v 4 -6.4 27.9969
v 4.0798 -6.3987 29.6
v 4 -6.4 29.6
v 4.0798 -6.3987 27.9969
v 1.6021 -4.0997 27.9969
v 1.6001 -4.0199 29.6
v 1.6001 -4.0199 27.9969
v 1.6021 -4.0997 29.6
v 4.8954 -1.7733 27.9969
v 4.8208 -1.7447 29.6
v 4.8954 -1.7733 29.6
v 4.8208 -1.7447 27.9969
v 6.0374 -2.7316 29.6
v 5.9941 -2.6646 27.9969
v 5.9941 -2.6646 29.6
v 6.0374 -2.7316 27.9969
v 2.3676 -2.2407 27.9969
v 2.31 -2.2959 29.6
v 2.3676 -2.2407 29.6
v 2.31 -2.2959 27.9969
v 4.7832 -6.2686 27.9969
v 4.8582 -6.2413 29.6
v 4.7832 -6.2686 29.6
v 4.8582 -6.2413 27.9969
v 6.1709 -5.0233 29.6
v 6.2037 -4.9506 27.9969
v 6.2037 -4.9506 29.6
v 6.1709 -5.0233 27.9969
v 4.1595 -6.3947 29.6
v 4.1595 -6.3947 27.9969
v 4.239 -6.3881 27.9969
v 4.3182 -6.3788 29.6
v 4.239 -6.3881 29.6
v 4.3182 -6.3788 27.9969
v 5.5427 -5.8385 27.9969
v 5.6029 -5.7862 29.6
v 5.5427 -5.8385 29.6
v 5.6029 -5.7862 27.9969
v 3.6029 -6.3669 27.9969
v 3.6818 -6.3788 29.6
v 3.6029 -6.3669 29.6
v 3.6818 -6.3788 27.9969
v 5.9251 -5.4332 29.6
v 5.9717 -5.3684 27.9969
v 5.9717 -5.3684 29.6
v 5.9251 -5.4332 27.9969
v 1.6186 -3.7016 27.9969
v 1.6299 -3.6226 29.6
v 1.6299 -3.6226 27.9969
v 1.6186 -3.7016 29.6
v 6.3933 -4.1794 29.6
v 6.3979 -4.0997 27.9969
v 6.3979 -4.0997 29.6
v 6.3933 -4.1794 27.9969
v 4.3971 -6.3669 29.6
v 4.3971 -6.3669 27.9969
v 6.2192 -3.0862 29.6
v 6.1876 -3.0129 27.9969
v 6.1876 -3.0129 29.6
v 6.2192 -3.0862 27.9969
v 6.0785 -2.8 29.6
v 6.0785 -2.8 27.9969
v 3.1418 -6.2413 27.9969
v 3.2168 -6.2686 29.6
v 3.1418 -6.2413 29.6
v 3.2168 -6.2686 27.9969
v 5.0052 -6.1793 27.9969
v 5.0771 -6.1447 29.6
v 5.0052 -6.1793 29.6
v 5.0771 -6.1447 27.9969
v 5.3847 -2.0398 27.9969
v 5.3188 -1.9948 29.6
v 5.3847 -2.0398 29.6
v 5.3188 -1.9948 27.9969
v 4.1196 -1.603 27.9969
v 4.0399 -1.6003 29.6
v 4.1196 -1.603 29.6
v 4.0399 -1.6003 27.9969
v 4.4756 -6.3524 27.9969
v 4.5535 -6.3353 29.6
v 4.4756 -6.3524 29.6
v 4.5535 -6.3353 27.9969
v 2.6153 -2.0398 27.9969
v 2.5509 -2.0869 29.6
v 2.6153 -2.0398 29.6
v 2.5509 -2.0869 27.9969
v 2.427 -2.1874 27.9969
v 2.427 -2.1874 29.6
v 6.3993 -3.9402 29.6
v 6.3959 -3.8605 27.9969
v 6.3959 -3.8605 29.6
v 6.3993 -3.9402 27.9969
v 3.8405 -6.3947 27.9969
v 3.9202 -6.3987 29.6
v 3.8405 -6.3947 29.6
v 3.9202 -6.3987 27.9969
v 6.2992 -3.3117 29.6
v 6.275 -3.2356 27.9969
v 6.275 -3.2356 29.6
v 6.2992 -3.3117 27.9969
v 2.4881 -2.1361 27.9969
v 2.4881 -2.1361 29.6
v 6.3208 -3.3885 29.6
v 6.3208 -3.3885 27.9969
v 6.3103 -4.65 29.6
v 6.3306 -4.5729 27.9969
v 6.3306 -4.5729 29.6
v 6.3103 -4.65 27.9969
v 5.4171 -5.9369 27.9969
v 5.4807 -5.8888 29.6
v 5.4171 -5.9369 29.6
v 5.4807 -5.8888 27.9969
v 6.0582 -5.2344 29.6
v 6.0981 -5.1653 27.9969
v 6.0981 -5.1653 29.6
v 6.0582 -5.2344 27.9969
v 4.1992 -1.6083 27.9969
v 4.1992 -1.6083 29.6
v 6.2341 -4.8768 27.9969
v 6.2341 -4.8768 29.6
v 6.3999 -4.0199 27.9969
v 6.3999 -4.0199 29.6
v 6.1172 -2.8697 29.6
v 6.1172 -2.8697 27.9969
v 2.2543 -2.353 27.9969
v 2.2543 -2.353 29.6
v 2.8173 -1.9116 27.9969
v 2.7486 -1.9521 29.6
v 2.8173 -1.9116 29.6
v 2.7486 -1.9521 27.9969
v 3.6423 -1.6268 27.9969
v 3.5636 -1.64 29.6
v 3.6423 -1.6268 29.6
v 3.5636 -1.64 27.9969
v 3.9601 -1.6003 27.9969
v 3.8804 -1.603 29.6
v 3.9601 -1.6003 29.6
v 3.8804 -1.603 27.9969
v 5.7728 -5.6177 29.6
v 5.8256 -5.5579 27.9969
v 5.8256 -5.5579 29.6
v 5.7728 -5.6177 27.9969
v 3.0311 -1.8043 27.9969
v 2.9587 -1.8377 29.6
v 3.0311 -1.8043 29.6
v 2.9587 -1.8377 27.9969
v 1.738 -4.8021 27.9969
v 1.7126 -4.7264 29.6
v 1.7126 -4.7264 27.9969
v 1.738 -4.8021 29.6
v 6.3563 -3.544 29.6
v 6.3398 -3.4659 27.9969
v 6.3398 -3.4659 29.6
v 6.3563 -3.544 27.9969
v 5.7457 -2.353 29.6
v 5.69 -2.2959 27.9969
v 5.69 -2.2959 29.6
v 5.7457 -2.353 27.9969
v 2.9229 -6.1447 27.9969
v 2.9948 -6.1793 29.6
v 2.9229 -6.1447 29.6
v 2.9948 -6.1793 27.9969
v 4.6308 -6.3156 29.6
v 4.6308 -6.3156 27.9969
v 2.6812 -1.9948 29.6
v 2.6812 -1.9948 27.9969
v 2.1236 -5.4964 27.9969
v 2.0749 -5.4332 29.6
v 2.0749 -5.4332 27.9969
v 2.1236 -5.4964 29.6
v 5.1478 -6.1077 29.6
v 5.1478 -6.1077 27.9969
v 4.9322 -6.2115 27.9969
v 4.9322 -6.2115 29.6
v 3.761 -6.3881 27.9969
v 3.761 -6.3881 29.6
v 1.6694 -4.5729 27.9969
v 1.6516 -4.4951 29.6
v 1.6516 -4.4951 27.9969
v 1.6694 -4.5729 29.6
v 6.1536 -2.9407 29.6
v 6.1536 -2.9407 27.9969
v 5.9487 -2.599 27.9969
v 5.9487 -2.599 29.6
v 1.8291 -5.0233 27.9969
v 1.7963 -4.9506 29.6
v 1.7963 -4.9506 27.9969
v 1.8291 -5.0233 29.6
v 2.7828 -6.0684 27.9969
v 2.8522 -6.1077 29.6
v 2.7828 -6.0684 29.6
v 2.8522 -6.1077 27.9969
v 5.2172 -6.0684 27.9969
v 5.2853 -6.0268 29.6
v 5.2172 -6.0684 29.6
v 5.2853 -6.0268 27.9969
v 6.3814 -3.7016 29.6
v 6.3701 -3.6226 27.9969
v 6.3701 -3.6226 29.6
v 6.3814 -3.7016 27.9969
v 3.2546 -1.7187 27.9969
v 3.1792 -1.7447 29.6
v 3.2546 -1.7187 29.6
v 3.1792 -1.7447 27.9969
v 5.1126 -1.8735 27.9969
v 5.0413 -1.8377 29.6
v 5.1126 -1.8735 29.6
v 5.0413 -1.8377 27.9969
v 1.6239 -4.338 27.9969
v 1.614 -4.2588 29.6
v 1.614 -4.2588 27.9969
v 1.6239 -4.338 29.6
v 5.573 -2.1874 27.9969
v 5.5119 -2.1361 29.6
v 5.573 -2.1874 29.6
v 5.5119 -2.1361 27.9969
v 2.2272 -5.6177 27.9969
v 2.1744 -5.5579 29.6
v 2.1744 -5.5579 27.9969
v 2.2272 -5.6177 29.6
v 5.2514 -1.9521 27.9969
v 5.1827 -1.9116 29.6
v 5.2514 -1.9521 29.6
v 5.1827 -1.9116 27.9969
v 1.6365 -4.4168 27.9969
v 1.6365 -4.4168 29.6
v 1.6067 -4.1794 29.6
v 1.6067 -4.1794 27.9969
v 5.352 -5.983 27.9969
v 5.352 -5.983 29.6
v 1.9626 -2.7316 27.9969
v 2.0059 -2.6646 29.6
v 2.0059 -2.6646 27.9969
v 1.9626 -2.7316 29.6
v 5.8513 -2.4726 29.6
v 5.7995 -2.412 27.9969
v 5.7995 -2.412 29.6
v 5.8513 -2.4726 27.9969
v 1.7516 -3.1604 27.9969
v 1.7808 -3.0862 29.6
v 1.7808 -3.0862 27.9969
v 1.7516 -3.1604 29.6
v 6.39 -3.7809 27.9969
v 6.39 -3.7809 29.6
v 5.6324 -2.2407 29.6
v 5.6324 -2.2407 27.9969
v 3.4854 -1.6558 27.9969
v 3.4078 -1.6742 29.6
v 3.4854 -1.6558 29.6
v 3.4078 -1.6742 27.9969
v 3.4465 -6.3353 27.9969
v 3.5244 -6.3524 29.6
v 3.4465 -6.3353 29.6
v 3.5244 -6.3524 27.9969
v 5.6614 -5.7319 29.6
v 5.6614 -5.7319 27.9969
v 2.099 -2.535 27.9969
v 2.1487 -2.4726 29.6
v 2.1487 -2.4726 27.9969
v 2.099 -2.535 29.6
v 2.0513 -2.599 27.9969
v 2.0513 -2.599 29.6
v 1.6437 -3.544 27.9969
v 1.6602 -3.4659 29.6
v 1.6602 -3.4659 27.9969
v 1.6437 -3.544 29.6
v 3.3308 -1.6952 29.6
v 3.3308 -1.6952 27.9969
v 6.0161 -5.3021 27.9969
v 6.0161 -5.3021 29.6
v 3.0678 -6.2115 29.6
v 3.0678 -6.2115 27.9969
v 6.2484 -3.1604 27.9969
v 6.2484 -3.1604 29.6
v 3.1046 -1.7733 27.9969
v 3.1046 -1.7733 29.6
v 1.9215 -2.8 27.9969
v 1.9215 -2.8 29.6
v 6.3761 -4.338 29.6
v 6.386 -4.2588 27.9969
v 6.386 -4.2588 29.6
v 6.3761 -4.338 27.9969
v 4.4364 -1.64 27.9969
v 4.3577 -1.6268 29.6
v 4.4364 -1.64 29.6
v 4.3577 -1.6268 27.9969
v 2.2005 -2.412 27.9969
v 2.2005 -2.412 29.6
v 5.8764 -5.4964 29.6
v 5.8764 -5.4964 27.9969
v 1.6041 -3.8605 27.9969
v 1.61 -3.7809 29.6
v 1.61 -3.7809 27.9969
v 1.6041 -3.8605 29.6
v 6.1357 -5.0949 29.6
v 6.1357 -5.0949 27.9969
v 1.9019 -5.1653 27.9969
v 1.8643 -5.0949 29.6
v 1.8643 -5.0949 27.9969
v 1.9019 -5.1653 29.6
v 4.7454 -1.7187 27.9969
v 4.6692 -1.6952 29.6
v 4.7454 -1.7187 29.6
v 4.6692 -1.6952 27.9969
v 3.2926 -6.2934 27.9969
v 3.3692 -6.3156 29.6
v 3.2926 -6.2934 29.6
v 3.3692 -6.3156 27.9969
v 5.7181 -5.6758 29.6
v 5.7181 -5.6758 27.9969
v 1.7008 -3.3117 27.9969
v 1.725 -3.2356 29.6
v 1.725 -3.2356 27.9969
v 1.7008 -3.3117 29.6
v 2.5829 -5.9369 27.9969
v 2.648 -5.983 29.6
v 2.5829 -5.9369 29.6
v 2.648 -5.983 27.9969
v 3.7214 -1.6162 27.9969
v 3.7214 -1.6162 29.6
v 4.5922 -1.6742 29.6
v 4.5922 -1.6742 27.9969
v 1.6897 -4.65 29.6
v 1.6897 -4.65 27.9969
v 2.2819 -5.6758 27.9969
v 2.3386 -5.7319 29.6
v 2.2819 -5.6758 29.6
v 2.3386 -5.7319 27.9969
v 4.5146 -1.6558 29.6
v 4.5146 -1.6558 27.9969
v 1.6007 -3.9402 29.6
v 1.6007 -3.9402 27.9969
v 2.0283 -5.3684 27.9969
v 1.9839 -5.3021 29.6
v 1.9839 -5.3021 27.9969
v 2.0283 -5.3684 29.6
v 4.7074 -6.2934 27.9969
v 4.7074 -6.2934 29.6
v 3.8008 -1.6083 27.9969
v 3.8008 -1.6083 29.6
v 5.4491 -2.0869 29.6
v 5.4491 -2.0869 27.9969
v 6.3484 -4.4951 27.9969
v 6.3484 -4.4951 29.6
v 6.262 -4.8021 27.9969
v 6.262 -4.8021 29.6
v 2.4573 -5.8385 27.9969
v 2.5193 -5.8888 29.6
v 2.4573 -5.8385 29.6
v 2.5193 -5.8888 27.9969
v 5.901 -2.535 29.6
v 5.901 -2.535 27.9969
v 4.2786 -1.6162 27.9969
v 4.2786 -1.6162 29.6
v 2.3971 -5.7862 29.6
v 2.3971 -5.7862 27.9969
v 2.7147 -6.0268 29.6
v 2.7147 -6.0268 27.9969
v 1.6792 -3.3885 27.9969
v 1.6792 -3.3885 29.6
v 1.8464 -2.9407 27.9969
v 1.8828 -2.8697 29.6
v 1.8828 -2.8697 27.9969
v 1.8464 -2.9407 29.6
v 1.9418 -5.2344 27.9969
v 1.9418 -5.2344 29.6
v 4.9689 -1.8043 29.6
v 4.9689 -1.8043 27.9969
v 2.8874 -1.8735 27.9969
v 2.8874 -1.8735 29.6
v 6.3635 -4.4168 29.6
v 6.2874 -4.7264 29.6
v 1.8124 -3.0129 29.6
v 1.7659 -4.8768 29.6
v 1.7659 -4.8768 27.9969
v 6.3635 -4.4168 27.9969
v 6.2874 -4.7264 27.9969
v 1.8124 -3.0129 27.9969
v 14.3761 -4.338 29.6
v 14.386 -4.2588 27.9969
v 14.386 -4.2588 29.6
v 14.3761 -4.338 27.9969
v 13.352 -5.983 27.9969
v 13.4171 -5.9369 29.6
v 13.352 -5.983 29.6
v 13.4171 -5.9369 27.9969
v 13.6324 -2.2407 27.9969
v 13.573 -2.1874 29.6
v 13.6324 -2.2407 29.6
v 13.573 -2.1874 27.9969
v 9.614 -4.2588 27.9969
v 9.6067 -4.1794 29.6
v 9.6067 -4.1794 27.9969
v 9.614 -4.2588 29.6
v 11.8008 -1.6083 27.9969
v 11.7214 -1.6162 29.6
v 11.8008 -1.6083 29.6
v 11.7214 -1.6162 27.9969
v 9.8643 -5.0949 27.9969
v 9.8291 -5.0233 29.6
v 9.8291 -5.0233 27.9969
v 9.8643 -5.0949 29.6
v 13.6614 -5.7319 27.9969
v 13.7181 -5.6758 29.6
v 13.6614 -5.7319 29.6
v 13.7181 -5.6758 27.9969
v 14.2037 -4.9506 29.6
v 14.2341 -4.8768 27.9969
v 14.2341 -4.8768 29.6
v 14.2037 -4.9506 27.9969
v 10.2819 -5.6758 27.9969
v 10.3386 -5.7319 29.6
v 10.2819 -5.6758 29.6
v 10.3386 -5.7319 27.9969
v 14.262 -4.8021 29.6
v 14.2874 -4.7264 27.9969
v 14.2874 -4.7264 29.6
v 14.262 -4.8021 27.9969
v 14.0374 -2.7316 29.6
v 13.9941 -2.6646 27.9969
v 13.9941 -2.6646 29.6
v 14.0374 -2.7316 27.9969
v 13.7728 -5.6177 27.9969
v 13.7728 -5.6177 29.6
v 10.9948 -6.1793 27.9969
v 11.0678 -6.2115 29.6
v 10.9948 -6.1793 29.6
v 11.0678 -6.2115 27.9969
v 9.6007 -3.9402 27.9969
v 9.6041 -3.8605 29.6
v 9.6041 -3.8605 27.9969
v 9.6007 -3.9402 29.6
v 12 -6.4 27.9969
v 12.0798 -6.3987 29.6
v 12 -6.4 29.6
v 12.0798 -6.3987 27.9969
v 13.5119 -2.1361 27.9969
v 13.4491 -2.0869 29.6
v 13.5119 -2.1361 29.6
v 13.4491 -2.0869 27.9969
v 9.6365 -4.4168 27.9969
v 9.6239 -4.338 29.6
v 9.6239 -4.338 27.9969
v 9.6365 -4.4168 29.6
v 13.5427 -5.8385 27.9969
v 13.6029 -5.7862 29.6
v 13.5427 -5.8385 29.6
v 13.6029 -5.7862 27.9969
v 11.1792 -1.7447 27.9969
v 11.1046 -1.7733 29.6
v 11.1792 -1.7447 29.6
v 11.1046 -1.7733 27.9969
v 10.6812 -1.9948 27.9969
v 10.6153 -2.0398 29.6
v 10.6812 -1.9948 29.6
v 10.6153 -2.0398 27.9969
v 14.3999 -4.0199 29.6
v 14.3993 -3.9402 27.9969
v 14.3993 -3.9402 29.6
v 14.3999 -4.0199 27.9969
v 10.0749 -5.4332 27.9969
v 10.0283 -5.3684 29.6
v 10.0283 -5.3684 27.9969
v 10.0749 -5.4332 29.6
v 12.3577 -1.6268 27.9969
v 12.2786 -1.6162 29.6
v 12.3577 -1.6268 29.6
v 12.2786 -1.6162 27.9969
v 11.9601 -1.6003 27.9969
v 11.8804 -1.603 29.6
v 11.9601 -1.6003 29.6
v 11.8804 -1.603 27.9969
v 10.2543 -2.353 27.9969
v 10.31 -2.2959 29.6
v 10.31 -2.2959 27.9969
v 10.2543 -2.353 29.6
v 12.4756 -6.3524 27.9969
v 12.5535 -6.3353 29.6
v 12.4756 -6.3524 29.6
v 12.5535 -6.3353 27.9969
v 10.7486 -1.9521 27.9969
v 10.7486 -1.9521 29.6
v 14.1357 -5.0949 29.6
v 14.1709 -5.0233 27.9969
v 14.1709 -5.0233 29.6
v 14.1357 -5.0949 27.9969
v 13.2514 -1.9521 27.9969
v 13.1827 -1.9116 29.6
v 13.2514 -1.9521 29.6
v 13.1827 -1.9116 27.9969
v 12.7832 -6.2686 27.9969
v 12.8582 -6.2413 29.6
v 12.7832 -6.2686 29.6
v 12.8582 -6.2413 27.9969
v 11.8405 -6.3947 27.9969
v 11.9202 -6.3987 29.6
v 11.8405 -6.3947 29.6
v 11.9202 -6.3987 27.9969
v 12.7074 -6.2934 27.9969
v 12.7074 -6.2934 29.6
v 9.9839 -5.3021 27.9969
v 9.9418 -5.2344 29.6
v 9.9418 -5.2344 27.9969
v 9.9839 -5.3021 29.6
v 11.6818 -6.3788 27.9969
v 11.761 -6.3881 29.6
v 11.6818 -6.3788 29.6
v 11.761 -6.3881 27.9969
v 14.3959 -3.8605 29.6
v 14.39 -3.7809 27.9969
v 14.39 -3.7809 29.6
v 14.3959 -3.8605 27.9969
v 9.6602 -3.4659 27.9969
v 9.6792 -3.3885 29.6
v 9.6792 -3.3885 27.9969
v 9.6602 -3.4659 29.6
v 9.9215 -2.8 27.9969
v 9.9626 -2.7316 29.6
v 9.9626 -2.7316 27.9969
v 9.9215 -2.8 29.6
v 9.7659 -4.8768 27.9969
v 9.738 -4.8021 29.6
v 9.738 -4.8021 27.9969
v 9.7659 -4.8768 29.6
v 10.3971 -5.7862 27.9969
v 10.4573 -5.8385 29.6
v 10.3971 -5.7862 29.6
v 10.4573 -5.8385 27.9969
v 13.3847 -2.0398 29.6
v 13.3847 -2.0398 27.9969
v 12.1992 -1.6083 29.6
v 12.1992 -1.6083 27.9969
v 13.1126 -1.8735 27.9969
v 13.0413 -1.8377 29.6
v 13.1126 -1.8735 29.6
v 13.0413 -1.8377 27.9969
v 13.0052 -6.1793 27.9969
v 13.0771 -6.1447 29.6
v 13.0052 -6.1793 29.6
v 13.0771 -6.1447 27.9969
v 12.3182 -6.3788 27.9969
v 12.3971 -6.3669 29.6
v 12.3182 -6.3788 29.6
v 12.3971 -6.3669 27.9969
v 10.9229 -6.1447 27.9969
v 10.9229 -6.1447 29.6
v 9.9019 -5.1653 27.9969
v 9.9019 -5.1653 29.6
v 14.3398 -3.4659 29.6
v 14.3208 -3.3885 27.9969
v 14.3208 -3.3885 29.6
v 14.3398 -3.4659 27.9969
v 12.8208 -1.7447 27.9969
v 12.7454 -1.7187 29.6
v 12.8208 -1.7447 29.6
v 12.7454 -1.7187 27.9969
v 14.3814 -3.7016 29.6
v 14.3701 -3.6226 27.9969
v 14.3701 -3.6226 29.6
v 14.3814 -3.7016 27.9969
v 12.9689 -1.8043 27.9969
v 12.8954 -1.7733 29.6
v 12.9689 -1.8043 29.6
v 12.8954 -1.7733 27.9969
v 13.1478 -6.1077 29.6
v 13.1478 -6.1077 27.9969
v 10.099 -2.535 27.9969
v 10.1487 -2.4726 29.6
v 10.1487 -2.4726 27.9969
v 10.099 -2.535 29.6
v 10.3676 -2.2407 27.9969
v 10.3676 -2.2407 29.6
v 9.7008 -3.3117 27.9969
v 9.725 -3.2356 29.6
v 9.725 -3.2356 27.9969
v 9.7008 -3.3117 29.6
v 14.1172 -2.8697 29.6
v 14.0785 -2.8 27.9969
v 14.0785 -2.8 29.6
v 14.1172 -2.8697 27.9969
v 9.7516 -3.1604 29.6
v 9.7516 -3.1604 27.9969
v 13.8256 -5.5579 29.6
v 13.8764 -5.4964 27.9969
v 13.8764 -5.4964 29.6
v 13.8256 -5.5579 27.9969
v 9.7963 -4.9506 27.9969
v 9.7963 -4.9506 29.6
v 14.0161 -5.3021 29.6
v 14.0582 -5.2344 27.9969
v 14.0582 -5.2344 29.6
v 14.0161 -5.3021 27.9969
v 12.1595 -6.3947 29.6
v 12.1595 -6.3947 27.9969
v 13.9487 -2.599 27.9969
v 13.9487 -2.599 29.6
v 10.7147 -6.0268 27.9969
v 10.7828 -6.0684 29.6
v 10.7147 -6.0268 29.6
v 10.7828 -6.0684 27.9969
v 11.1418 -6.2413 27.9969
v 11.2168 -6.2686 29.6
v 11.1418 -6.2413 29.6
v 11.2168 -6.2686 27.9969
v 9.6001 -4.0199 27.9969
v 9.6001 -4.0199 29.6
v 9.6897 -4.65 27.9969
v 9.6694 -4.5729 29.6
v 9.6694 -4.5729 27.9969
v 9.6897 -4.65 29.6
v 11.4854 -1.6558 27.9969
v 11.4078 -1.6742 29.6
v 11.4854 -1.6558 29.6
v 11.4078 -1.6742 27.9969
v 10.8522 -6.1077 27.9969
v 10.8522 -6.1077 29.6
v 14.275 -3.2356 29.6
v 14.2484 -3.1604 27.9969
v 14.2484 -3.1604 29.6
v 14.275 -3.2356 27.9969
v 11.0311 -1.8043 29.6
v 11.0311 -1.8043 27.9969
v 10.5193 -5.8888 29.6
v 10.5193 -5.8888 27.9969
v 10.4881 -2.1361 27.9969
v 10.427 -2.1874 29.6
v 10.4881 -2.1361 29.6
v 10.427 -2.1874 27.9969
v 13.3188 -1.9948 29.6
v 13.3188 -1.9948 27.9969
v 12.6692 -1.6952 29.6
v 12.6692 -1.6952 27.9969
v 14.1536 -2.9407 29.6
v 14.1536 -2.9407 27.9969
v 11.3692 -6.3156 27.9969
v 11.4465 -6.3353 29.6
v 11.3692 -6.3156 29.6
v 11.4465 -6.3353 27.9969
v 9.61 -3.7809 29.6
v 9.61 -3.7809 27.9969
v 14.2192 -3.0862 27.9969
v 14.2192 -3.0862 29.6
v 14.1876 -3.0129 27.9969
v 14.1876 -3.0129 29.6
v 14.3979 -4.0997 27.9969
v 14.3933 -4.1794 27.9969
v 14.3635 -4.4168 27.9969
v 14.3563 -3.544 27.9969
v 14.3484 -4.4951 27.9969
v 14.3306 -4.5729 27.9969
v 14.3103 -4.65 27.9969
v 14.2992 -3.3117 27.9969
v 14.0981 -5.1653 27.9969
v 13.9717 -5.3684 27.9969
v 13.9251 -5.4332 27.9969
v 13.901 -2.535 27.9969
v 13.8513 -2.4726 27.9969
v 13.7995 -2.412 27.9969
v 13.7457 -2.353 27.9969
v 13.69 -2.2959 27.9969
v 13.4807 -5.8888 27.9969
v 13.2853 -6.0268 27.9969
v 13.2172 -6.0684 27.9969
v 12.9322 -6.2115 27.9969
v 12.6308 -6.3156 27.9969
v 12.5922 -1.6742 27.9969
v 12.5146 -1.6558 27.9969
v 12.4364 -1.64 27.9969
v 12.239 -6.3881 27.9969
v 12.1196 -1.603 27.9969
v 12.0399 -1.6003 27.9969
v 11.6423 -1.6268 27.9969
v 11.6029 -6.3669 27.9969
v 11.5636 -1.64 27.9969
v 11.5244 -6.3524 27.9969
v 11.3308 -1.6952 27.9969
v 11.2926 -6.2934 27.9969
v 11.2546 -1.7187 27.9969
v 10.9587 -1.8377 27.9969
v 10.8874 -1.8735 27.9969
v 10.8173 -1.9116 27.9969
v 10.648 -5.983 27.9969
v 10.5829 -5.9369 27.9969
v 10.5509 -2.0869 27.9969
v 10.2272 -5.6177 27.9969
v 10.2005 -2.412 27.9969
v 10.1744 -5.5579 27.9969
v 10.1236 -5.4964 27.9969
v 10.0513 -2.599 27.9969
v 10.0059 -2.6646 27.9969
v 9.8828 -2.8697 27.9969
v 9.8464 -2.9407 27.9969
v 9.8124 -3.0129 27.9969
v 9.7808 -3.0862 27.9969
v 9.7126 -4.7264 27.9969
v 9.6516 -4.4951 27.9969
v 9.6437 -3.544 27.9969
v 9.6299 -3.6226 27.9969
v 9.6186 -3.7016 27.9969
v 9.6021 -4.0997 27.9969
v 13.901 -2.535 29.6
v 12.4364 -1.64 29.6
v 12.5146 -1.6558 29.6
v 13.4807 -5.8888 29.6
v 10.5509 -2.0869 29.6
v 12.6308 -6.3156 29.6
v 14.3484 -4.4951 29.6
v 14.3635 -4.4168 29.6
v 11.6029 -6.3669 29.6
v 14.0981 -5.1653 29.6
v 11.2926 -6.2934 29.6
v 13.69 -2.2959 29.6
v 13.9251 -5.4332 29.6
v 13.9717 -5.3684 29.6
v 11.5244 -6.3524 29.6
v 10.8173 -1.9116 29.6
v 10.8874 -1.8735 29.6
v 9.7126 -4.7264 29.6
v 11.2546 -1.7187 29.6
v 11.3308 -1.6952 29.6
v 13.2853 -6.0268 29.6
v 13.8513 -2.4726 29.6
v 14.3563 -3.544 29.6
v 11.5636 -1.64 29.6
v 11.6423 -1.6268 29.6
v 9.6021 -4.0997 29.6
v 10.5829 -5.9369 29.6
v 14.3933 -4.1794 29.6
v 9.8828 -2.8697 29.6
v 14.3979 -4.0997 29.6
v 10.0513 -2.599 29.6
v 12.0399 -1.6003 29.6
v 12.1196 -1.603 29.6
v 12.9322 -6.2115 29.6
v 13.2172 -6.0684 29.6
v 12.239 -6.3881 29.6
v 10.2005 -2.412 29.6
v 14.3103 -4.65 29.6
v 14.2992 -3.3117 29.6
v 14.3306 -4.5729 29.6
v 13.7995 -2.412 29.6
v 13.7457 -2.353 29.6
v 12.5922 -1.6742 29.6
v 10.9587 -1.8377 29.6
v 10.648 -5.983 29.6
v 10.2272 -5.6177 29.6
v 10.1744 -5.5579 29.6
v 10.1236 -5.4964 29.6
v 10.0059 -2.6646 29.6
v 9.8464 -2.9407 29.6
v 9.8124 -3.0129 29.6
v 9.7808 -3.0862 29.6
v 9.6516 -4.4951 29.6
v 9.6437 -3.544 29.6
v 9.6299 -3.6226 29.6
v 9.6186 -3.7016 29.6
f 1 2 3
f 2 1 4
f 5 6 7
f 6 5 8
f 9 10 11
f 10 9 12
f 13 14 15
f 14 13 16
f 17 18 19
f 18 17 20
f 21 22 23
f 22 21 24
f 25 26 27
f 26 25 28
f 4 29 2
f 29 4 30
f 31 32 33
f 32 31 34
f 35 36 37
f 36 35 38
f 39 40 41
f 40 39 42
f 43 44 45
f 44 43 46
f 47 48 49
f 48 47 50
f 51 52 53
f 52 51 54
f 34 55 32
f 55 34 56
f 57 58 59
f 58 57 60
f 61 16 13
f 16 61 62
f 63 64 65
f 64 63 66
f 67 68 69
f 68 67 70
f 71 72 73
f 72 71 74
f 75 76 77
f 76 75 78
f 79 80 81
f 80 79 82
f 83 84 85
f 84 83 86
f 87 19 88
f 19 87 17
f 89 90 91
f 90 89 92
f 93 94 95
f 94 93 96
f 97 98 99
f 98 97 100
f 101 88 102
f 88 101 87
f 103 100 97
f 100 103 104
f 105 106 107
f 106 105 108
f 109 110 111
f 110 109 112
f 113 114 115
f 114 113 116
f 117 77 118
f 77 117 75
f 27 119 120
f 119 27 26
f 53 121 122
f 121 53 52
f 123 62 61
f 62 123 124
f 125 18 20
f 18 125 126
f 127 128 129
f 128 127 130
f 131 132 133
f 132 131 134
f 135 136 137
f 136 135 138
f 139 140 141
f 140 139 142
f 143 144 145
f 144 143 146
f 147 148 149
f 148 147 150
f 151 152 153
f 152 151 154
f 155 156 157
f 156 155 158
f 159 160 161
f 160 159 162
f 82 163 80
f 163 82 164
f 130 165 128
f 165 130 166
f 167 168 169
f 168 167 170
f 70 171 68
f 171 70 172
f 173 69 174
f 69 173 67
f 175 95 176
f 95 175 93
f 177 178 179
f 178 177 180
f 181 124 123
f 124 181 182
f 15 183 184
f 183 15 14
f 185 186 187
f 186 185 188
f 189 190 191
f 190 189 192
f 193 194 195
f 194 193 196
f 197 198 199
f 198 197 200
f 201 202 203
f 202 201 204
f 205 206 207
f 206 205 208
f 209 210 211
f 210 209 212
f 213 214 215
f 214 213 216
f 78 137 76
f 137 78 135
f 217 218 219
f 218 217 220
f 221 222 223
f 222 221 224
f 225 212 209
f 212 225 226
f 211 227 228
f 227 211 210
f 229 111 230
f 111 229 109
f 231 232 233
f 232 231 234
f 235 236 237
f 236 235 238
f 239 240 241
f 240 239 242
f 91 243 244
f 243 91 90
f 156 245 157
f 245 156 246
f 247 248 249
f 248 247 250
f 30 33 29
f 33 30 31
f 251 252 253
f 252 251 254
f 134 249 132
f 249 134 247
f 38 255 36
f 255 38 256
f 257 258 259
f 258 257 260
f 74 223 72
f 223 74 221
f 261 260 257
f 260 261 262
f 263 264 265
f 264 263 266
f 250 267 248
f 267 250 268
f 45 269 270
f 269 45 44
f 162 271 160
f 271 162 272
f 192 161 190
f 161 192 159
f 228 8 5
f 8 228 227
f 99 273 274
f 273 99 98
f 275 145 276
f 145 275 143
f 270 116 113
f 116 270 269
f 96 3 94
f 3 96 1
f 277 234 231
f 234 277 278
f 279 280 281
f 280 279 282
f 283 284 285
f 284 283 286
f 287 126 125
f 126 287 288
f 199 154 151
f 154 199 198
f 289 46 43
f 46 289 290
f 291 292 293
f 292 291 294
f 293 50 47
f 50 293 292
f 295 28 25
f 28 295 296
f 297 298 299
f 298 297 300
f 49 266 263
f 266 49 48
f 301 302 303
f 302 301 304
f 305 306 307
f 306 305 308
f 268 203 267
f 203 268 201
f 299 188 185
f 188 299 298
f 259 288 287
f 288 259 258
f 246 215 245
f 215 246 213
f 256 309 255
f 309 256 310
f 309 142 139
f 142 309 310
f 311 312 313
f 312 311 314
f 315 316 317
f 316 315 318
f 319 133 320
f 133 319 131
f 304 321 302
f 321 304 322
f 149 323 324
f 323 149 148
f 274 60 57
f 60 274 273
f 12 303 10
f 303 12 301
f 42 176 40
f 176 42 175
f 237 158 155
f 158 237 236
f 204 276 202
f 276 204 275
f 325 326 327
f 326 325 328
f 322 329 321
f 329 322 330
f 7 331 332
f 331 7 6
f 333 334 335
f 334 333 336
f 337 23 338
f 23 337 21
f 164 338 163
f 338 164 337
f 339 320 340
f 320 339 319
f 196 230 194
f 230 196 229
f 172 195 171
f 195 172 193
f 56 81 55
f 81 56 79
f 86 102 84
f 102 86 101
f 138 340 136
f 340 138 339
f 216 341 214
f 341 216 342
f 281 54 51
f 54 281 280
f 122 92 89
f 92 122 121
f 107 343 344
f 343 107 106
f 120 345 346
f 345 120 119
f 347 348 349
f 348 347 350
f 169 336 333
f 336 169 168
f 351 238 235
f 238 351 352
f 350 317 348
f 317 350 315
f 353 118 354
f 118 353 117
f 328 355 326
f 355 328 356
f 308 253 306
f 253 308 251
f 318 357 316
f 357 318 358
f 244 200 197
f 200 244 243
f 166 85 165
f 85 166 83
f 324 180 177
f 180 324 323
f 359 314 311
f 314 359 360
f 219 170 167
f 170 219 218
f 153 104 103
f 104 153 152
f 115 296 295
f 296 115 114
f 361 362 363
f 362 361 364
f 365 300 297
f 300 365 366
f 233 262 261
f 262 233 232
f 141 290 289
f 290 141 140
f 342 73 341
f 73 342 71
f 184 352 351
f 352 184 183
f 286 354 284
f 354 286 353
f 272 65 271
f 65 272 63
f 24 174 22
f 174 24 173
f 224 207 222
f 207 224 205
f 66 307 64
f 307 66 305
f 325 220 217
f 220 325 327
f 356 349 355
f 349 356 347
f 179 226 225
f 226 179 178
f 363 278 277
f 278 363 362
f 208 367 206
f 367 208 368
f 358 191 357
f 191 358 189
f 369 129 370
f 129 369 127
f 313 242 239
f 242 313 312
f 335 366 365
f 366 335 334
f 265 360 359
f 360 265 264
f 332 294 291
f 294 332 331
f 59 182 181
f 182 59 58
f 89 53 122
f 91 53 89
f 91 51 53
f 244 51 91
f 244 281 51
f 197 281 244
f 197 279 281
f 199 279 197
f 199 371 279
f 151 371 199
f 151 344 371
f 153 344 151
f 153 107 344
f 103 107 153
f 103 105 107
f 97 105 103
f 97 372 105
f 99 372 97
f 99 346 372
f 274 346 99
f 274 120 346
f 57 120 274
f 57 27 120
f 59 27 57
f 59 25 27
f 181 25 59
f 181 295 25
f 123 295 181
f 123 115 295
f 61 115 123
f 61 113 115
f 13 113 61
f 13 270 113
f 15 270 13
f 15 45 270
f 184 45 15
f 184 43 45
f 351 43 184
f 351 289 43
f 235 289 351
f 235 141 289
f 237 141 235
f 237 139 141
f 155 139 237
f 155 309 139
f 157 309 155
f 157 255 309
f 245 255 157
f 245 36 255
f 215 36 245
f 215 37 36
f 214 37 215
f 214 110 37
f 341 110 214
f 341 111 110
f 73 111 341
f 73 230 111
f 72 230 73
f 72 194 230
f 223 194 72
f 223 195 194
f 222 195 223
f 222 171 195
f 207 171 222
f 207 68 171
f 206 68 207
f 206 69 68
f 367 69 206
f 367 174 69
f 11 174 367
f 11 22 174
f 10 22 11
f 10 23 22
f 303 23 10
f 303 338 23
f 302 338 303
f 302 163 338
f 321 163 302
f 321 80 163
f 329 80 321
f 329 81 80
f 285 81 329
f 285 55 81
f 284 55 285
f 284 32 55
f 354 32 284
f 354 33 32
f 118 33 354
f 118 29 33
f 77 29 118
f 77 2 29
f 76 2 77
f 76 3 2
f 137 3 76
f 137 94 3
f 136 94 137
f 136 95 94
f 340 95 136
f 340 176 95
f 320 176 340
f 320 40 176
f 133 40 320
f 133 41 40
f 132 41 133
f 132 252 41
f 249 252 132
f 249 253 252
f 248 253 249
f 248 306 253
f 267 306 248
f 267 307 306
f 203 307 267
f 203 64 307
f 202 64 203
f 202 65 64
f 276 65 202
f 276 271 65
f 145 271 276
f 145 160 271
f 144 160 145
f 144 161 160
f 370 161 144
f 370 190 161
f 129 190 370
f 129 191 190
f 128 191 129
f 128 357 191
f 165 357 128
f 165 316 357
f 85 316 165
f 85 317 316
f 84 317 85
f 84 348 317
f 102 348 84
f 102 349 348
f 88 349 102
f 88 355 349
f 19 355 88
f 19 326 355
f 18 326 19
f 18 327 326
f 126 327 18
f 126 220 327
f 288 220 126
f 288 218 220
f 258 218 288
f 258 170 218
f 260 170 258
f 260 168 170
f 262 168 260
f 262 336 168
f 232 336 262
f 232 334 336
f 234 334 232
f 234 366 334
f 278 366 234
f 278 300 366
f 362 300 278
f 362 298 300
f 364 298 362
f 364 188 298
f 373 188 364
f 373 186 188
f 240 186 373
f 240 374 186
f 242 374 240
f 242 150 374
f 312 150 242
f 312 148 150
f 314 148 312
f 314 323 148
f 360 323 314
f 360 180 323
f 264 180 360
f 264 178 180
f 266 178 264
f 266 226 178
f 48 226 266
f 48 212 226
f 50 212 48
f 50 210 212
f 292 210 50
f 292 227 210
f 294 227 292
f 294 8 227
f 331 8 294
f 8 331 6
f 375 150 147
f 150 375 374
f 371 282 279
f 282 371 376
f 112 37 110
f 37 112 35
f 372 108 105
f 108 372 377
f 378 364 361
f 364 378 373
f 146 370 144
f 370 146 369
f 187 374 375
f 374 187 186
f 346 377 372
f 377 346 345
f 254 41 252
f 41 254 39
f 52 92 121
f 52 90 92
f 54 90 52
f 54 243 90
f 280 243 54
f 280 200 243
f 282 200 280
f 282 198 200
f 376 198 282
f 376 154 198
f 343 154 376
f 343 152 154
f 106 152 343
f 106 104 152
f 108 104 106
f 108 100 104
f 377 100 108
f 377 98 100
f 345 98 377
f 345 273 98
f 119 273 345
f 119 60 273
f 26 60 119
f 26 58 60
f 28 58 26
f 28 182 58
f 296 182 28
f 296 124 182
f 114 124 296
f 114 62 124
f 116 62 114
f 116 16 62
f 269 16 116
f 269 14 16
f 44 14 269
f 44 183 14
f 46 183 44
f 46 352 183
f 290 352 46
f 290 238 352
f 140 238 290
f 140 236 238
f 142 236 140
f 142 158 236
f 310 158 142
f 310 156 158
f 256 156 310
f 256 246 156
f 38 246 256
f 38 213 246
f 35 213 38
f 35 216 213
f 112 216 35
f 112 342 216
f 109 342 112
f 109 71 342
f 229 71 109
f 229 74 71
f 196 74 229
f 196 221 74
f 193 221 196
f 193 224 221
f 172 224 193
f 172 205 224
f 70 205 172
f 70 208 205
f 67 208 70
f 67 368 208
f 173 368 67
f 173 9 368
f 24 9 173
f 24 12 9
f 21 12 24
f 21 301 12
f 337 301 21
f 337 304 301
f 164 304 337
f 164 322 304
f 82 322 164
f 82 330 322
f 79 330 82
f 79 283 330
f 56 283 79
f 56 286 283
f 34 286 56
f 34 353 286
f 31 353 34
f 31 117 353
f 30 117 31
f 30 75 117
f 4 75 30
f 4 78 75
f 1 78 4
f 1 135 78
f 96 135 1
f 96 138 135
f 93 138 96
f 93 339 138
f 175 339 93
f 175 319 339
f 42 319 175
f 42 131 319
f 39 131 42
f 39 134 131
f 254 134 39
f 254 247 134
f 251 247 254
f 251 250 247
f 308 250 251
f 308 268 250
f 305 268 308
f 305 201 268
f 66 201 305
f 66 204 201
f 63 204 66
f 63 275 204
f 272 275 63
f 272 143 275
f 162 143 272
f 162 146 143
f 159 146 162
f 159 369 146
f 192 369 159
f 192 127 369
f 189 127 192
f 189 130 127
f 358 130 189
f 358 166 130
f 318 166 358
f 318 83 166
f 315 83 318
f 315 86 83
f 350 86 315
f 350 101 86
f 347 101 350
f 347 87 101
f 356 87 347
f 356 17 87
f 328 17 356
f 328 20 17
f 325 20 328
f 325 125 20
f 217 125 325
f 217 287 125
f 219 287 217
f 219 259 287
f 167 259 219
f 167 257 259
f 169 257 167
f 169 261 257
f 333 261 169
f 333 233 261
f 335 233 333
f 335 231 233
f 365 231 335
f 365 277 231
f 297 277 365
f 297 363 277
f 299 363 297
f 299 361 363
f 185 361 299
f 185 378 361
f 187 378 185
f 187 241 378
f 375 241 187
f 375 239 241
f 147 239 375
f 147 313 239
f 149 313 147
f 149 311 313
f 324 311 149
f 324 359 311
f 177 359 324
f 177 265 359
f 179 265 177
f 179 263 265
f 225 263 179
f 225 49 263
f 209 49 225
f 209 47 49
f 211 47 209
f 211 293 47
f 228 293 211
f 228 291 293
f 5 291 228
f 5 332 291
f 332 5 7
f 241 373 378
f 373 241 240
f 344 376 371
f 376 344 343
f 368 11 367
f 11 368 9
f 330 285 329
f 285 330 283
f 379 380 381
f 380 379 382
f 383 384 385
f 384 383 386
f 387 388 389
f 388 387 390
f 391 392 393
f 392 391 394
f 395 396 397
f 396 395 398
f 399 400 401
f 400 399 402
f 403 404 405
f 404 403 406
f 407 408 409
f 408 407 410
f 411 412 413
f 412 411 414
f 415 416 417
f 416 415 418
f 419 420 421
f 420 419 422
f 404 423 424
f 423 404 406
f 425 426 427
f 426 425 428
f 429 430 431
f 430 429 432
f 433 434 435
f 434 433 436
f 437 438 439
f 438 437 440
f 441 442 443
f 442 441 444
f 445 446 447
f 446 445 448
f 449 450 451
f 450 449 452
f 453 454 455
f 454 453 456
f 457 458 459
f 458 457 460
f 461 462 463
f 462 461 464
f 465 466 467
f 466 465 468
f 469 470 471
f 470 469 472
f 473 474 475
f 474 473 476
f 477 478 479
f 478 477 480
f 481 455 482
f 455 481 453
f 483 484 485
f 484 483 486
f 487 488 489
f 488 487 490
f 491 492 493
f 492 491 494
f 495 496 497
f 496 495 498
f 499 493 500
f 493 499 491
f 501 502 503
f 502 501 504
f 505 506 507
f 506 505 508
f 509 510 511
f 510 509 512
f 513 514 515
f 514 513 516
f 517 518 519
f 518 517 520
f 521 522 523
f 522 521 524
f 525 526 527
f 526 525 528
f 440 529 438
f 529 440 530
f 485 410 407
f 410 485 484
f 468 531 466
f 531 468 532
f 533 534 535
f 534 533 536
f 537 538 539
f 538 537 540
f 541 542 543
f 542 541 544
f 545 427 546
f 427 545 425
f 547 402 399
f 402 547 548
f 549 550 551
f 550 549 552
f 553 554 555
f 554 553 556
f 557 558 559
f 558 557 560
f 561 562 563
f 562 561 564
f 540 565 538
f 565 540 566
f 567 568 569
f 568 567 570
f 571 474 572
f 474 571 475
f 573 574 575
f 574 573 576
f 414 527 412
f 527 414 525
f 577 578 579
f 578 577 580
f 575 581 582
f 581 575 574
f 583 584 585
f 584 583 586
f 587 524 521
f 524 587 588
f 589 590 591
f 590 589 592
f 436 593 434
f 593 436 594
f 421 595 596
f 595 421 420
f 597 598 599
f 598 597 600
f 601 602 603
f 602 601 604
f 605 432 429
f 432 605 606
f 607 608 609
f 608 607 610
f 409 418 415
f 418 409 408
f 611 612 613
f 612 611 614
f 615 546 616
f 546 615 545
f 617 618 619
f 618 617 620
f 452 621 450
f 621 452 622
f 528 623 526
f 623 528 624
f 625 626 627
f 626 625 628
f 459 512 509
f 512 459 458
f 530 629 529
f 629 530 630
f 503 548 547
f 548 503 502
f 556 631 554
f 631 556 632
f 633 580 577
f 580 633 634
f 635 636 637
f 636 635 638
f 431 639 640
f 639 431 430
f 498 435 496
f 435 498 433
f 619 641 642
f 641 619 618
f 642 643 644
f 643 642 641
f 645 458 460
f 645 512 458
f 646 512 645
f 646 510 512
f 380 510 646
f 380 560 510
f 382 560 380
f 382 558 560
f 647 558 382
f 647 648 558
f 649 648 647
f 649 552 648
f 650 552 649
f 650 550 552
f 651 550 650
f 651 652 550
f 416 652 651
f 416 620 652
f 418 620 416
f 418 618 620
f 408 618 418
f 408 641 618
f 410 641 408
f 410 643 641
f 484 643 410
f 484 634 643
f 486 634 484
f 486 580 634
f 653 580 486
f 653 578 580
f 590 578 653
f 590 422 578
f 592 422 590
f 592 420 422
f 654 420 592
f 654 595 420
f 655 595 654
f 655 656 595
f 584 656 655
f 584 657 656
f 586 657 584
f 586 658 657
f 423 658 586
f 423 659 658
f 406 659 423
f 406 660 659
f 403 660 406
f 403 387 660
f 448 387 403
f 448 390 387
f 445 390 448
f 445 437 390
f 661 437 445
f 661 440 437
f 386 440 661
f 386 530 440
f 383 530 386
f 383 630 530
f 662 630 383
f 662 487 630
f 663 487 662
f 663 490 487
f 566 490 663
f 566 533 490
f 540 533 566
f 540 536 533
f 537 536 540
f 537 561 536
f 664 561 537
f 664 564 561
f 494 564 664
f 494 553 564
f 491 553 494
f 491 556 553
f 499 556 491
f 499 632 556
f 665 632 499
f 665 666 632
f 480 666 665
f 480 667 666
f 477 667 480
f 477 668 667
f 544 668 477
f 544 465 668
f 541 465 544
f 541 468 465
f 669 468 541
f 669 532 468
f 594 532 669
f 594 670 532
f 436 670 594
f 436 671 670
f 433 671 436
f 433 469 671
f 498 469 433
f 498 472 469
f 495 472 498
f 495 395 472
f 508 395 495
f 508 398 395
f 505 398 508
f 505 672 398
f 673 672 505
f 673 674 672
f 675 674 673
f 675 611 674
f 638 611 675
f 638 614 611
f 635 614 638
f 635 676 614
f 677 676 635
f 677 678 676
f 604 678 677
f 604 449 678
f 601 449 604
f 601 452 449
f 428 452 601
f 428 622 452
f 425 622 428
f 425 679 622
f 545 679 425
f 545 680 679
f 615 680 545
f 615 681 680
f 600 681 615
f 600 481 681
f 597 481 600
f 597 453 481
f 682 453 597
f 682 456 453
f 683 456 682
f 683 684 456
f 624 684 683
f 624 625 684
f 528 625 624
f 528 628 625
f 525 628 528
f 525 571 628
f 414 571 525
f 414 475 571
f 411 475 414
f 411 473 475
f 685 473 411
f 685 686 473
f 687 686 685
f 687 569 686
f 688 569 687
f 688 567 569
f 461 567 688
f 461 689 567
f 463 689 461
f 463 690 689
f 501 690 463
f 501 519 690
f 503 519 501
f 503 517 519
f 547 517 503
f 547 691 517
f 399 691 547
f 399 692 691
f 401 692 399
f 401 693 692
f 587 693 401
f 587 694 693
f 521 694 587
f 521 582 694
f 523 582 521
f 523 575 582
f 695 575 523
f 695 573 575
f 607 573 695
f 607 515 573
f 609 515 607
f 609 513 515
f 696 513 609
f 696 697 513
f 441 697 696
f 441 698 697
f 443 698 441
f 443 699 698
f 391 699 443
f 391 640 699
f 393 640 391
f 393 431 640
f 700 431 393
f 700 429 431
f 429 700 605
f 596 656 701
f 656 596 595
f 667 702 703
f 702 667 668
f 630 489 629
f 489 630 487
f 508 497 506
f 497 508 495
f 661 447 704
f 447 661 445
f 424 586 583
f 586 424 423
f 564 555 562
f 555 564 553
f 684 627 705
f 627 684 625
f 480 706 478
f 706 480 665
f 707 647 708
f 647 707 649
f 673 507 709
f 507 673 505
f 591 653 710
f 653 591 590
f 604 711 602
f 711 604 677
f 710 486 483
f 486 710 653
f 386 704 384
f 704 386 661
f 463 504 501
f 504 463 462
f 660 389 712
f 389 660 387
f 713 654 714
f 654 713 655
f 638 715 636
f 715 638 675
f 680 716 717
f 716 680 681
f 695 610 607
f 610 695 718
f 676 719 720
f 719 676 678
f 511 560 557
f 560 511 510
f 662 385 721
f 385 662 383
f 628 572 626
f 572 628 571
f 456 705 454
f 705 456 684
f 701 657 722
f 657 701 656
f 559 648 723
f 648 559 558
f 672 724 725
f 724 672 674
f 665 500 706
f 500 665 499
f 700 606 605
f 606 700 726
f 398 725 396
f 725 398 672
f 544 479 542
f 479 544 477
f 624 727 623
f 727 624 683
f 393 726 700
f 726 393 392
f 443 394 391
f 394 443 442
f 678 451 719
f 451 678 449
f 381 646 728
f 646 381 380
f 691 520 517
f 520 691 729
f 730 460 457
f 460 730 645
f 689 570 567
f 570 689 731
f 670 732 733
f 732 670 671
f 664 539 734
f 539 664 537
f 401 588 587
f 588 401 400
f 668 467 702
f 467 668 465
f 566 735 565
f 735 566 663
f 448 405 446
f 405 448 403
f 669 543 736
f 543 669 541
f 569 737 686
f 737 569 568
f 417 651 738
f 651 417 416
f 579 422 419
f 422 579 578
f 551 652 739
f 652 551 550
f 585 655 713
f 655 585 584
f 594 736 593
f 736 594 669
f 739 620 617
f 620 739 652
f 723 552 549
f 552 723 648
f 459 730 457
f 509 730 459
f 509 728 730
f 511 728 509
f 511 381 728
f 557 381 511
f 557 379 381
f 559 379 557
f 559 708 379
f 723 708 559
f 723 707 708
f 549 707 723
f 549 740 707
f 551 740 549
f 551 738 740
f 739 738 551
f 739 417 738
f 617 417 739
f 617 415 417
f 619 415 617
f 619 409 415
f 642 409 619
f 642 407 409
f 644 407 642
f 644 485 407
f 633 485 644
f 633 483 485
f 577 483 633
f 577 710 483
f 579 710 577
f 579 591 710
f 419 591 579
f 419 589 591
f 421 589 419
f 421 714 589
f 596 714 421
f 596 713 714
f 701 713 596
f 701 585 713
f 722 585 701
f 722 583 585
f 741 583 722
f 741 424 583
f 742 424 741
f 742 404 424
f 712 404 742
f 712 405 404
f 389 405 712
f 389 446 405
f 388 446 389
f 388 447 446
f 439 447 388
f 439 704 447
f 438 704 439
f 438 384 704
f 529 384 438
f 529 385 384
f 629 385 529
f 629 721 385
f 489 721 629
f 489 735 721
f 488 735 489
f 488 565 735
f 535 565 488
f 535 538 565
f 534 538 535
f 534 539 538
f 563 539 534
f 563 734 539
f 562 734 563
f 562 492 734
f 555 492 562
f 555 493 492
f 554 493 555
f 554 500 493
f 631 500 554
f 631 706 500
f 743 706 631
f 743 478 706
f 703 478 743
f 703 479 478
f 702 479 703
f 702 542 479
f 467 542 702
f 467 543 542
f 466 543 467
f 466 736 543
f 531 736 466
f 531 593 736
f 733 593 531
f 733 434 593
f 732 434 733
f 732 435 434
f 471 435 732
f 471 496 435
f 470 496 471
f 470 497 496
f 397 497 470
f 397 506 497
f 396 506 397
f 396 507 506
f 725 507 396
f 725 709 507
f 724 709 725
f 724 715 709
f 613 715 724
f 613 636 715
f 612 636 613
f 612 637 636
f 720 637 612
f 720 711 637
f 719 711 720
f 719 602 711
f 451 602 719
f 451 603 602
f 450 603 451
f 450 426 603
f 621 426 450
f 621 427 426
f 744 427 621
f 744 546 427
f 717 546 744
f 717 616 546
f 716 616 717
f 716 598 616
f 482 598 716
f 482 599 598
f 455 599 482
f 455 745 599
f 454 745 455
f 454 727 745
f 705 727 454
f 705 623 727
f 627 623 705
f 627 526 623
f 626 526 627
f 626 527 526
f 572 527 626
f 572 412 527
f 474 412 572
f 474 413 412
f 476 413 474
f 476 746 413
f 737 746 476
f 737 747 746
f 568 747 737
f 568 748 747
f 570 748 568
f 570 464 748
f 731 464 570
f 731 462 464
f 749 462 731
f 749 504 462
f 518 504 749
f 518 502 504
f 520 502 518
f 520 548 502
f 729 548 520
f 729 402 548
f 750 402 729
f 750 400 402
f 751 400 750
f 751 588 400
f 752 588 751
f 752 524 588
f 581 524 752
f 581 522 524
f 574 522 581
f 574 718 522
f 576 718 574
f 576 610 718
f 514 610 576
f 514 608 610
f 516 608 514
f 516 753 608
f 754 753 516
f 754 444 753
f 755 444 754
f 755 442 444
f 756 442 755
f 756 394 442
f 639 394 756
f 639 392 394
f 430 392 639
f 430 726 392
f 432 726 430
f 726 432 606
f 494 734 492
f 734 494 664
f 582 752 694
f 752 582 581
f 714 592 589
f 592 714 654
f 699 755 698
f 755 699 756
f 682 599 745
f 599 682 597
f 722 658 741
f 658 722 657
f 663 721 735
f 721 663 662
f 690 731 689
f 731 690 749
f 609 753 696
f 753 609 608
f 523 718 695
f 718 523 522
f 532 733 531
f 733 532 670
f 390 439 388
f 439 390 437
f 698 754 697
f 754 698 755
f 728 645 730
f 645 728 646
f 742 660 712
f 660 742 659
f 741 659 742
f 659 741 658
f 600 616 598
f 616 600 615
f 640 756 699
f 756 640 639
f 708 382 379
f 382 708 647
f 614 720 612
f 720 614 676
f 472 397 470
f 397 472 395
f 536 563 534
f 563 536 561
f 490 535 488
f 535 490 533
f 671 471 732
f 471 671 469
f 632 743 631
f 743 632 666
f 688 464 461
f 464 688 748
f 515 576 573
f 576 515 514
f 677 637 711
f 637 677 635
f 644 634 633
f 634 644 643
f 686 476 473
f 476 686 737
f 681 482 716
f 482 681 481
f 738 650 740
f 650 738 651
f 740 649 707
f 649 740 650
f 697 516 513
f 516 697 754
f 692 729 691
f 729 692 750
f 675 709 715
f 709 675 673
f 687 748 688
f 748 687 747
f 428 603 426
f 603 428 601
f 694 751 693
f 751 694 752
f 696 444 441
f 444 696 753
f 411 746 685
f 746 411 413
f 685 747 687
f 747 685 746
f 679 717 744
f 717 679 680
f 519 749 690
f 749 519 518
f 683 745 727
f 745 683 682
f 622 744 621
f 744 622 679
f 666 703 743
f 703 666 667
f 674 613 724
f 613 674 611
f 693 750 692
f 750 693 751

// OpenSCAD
use <../lib.scad>
use <921.scad>
use <922.scad>
use <923.scad>
$fa=1; $fs=0.2;
function ldraw_lib__54734(realsolid=false) = [
// 0 Electric  9V Battery Box with Pegholes (Complete)
// 0 Name: 54734.dat
// 0 Author: Philippe Hurbain [Philo]
// 0 !LDRAW_ORG Shortcut UPDATE 2011-01
// 0 !LICENSE Licensed under CC BY 2.0 and CC BY 4.0 : see CAreadme.txt
// 
// 0 BFC CERTIFY CW
  [0,"BFC","CERTIFY"],
  [0,"BFC","CW"],
// 
// 0 !HISTORY 2011-07-25 [PTadmin] Official Update 2011-01
// 
// 
// 1 16 0 0 0 1 0 0 0 1 0 0 0 1 923.dat
  [1,16,0,0,0,1,0,0,0,1,0,0,0,1, ldraw_lib__923(realsolid)],
// 1 16 5 0 -40 1 0 0 0 1 0 0 0 1 921.dat
  [1,16,5,0,-40,1,0,0,0,1,0,0,0,1, ldraw_lib__921(realsolid)],
// 1 16 -5 0 40 -1 0 0 0 1 0 0 0 -1 921.dat
  [1,16,-5,0,40,-1,0,0,0,1,0,0,0,-1, ldraw_lib__921(realsolid)],
// 1 4 20 -70 -10 0 0 1 0 1 0 -1 0 0 922.dat
  [1,4,20,-70,-10,0,0,1,0,1,0,-1,0,0, ldraw_lib__922(realsolid)],
];
module ldraw_lib__54734(step=0, col=false, unit=2/5, alt=false, line=0.2, solid=!$preview)
    makepoly(ldraw_lib__54734(solid), step=step, col=col, unit=unit, alt=alt, line=line, solid=solid);
ldraw_lib__54734(line=0.2);
